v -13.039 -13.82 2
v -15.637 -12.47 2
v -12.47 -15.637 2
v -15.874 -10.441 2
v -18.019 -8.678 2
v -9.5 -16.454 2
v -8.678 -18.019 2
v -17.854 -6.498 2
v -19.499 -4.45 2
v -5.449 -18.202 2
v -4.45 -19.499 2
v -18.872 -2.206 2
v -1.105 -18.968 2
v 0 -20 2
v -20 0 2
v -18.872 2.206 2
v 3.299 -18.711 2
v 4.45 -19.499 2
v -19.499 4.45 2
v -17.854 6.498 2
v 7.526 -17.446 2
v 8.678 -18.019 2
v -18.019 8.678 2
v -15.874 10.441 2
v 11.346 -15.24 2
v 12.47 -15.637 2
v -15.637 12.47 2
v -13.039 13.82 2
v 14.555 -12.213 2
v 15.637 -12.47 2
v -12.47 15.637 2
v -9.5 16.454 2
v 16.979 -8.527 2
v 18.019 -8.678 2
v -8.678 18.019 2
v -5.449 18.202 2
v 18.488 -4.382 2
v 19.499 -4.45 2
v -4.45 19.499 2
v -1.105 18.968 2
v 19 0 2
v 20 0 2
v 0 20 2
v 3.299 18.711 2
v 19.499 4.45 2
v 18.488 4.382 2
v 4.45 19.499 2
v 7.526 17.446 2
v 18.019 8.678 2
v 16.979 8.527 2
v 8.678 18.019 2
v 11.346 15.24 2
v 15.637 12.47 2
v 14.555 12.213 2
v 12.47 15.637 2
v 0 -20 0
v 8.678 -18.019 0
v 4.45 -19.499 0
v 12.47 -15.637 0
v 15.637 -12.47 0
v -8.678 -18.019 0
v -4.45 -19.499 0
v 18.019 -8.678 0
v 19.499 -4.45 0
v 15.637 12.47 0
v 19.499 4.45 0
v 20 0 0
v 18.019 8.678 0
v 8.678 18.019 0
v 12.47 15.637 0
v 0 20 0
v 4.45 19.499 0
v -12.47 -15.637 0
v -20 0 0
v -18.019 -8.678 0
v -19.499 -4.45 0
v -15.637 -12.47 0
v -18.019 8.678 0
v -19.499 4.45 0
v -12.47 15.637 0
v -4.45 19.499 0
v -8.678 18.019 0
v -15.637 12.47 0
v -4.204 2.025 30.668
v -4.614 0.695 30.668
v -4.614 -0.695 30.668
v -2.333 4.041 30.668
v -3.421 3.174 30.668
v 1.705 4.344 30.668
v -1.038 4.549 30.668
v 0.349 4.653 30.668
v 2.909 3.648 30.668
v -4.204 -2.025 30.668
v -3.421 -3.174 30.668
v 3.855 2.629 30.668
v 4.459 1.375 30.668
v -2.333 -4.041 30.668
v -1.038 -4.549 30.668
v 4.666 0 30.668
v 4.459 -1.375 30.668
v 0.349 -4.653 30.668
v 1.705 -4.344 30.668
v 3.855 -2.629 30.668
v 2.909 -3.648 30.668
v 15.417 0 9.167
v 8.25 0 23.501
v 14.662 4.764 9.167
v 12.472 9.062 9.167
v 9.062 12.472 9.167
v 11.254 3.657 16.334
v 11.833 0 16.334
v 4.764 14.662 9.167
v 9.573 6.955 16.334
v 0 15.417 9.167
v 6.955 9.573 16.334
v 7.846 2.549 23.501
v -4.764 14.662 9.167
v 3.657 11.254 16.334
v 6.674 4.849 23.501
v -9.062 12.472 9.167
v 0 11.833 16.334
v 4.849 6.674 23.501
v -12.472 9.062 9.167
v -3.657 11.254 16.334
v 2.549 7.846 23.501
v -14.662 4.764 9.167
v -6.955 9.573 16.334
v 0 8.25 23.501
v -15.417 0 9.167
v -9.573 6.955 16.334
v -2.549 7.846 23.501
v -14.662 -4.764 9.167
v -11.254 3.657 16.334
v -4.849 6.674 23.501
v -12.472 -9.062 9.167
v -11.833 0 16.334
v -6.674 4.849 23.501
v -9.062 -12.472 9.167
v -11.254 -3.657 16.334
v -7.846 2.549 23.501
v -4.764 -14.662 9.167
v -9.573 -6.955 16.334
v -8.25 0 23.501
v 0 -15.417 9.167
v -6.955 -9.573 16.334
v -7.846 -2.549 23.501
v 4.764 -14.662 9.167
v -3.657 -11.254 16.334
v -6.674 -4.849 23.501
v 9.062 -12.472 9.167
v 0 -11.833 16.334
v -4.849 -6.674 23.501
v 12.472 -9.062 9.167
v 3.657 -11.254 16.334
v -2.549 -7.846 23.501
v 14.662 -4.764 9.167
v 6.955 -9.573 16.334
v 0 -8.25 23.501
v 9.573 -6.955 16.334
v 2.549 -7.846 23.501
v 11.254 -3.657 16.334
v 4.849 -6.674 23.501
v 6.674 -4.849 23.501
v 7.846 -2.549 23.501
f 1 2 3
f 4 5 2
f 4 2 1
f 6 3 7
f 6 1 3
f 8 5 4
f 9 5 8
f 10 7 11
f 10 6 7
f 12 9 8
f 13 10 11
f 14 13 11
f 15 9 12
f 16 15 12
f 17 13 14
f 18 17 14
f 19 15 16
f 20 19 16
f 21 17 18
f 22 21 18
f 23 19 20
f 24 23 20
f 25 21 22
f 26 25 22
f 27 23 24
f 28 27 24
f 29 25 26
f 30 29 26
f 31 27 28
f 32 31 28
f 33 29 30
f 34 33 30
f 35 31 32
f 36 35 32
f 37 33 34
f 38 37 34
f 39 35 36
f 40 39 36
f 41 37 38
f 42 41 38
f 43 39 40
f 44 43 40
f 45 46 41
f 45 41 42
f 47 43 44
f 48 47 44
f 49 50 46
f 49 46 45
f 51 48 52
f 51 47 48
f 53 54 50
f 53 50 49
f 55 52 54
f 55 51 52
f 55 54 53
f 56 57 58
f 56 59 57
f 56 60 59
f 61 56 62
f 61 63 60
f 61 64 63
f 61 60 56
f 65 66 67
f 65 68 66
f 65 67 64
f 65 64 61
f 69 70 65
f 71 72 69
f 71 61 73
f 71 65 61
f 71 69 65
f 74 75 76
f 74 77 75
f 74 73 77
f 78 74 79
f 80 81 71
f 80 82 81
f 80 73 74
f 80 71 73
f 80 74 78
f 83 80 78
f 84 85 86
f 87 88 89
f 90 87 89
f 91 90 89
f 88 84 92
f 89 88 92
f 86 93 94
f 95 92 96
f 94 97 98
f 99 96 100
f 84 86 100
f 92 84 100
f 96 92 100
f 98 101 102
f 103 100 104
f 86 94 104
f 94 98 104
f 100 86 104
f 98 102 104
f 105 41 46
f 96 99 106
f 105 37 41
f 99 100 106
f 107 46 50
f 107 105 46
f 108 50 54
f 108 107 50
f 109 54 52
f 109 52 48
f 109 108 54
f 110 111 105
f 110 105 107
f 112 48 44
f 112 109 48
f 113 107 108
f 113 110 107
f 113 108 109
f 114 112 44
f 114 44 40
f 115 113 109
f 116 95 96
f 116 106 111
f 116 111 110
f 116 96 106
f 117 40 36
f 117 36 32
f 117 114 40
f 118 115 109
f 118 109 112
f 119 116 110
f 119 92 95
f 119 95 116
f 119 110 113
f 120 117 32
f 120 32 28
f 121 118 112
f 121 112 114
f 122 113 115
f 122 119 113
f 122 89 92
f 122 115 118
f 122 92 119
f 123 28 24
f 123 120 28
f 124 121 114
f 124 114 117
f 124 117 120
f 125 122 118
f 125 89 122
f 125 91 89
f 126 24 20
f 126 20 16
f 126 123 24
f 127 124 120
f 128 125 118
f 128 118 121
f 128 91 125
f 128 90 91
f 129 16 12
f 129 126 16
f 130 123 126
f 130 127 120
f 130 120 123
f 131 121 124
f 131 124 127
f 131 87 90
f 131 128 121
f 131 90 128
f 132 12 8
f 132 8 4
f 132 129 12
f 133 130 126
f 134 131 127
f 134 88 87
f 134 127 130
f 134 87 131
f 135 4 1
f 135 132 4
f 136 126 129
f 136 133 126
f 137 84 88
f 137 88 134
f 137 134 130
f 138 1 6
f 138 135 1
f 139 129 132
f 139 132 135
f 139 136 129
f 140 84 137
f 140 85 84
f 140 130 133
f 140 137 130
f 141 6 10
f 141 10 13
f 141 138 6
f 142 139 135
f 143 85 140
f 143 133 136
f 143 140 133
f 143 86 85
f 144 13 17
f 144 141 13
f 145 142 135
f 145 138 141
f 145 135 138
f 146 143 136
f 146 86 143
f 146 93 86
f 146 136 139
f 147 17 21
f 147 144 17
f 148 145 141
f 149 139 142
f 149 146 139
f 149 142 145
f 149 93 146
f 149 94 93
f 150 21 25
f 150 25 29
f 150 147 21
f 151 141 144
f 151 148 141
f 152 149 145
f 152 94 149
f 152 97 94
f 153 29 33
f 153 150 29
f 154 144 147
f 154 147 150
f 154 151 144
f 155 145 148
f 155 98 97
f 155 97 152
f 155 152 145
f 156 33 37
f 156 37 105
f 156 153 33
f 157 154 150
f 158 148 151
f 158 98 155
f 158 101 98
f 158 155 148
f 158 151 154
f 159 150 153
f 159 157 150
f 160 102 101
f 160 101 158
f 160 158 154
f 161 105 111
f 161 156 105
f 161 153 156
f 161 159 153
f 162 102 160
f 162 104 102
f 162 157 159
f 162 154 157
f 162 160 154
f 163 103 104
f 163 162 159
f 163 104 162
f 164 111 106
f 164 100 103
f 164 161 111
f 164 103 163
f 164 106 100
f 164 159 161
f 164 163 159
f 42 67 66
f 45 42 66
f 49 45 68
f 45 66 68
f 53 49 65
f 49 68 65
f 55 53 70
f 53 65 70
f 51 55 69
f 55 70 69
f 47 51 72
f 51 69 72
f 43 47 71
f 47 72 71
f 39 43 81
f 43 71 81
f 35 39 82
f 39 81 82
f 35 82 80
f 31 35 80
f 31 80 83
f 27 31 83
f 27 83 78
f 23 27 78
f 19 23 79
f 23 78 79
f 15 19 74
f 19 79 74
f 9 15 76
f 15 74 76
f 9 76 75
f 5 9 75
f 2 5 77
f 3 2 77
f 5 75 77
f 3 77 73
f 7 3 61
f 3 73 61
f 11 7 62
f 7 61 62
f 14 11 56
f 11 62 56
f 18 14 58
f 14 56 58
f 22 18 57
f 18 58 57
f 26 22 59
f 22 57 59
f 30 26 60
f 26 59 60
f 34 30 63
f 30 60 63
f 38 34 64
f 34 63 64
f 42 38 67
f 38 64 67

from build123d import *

# Parameters (mm, degrees)
F2_R          = 20
F3_DEPTH      = 2
F4_W          = 15.1418782771
F4_H          = 14.9113200605
F5_DEPTH      = 25
F5_DEPTH_BACK = 25


with BuildPart() as f1:
    # F0 (on Front) → F1 (revolve)
    with BuildSketch(Plane.XZ):
        Polygon((0, 40), (0, 0), (20, 0), align=None)
    revolve(axis=Axis((0, 0, 20), (0, 0, 1)))

    # F2 (on Top) → F3 (join)
    with BuildSketch(Plane.XY):
        Circle(F2_R)
    extrude(amount=F3_DEPTH)

    # F4 (on Front) → F5 (cut, two sides)
    with BuildSketch(Plane.XZ) as f5_sk:
        with Locations((0.5040215328, 38.1232108921)):
            Rectangle(F4_W, F4_H)
    extrude(amount=-F5_DEPTH, mode=Mode.SUBTRACT)
    extrude(f5_sk.sketch, amount=F5_DEPTH_BACK, mode=Mode.SUBTRACT)


solid = f1.part
